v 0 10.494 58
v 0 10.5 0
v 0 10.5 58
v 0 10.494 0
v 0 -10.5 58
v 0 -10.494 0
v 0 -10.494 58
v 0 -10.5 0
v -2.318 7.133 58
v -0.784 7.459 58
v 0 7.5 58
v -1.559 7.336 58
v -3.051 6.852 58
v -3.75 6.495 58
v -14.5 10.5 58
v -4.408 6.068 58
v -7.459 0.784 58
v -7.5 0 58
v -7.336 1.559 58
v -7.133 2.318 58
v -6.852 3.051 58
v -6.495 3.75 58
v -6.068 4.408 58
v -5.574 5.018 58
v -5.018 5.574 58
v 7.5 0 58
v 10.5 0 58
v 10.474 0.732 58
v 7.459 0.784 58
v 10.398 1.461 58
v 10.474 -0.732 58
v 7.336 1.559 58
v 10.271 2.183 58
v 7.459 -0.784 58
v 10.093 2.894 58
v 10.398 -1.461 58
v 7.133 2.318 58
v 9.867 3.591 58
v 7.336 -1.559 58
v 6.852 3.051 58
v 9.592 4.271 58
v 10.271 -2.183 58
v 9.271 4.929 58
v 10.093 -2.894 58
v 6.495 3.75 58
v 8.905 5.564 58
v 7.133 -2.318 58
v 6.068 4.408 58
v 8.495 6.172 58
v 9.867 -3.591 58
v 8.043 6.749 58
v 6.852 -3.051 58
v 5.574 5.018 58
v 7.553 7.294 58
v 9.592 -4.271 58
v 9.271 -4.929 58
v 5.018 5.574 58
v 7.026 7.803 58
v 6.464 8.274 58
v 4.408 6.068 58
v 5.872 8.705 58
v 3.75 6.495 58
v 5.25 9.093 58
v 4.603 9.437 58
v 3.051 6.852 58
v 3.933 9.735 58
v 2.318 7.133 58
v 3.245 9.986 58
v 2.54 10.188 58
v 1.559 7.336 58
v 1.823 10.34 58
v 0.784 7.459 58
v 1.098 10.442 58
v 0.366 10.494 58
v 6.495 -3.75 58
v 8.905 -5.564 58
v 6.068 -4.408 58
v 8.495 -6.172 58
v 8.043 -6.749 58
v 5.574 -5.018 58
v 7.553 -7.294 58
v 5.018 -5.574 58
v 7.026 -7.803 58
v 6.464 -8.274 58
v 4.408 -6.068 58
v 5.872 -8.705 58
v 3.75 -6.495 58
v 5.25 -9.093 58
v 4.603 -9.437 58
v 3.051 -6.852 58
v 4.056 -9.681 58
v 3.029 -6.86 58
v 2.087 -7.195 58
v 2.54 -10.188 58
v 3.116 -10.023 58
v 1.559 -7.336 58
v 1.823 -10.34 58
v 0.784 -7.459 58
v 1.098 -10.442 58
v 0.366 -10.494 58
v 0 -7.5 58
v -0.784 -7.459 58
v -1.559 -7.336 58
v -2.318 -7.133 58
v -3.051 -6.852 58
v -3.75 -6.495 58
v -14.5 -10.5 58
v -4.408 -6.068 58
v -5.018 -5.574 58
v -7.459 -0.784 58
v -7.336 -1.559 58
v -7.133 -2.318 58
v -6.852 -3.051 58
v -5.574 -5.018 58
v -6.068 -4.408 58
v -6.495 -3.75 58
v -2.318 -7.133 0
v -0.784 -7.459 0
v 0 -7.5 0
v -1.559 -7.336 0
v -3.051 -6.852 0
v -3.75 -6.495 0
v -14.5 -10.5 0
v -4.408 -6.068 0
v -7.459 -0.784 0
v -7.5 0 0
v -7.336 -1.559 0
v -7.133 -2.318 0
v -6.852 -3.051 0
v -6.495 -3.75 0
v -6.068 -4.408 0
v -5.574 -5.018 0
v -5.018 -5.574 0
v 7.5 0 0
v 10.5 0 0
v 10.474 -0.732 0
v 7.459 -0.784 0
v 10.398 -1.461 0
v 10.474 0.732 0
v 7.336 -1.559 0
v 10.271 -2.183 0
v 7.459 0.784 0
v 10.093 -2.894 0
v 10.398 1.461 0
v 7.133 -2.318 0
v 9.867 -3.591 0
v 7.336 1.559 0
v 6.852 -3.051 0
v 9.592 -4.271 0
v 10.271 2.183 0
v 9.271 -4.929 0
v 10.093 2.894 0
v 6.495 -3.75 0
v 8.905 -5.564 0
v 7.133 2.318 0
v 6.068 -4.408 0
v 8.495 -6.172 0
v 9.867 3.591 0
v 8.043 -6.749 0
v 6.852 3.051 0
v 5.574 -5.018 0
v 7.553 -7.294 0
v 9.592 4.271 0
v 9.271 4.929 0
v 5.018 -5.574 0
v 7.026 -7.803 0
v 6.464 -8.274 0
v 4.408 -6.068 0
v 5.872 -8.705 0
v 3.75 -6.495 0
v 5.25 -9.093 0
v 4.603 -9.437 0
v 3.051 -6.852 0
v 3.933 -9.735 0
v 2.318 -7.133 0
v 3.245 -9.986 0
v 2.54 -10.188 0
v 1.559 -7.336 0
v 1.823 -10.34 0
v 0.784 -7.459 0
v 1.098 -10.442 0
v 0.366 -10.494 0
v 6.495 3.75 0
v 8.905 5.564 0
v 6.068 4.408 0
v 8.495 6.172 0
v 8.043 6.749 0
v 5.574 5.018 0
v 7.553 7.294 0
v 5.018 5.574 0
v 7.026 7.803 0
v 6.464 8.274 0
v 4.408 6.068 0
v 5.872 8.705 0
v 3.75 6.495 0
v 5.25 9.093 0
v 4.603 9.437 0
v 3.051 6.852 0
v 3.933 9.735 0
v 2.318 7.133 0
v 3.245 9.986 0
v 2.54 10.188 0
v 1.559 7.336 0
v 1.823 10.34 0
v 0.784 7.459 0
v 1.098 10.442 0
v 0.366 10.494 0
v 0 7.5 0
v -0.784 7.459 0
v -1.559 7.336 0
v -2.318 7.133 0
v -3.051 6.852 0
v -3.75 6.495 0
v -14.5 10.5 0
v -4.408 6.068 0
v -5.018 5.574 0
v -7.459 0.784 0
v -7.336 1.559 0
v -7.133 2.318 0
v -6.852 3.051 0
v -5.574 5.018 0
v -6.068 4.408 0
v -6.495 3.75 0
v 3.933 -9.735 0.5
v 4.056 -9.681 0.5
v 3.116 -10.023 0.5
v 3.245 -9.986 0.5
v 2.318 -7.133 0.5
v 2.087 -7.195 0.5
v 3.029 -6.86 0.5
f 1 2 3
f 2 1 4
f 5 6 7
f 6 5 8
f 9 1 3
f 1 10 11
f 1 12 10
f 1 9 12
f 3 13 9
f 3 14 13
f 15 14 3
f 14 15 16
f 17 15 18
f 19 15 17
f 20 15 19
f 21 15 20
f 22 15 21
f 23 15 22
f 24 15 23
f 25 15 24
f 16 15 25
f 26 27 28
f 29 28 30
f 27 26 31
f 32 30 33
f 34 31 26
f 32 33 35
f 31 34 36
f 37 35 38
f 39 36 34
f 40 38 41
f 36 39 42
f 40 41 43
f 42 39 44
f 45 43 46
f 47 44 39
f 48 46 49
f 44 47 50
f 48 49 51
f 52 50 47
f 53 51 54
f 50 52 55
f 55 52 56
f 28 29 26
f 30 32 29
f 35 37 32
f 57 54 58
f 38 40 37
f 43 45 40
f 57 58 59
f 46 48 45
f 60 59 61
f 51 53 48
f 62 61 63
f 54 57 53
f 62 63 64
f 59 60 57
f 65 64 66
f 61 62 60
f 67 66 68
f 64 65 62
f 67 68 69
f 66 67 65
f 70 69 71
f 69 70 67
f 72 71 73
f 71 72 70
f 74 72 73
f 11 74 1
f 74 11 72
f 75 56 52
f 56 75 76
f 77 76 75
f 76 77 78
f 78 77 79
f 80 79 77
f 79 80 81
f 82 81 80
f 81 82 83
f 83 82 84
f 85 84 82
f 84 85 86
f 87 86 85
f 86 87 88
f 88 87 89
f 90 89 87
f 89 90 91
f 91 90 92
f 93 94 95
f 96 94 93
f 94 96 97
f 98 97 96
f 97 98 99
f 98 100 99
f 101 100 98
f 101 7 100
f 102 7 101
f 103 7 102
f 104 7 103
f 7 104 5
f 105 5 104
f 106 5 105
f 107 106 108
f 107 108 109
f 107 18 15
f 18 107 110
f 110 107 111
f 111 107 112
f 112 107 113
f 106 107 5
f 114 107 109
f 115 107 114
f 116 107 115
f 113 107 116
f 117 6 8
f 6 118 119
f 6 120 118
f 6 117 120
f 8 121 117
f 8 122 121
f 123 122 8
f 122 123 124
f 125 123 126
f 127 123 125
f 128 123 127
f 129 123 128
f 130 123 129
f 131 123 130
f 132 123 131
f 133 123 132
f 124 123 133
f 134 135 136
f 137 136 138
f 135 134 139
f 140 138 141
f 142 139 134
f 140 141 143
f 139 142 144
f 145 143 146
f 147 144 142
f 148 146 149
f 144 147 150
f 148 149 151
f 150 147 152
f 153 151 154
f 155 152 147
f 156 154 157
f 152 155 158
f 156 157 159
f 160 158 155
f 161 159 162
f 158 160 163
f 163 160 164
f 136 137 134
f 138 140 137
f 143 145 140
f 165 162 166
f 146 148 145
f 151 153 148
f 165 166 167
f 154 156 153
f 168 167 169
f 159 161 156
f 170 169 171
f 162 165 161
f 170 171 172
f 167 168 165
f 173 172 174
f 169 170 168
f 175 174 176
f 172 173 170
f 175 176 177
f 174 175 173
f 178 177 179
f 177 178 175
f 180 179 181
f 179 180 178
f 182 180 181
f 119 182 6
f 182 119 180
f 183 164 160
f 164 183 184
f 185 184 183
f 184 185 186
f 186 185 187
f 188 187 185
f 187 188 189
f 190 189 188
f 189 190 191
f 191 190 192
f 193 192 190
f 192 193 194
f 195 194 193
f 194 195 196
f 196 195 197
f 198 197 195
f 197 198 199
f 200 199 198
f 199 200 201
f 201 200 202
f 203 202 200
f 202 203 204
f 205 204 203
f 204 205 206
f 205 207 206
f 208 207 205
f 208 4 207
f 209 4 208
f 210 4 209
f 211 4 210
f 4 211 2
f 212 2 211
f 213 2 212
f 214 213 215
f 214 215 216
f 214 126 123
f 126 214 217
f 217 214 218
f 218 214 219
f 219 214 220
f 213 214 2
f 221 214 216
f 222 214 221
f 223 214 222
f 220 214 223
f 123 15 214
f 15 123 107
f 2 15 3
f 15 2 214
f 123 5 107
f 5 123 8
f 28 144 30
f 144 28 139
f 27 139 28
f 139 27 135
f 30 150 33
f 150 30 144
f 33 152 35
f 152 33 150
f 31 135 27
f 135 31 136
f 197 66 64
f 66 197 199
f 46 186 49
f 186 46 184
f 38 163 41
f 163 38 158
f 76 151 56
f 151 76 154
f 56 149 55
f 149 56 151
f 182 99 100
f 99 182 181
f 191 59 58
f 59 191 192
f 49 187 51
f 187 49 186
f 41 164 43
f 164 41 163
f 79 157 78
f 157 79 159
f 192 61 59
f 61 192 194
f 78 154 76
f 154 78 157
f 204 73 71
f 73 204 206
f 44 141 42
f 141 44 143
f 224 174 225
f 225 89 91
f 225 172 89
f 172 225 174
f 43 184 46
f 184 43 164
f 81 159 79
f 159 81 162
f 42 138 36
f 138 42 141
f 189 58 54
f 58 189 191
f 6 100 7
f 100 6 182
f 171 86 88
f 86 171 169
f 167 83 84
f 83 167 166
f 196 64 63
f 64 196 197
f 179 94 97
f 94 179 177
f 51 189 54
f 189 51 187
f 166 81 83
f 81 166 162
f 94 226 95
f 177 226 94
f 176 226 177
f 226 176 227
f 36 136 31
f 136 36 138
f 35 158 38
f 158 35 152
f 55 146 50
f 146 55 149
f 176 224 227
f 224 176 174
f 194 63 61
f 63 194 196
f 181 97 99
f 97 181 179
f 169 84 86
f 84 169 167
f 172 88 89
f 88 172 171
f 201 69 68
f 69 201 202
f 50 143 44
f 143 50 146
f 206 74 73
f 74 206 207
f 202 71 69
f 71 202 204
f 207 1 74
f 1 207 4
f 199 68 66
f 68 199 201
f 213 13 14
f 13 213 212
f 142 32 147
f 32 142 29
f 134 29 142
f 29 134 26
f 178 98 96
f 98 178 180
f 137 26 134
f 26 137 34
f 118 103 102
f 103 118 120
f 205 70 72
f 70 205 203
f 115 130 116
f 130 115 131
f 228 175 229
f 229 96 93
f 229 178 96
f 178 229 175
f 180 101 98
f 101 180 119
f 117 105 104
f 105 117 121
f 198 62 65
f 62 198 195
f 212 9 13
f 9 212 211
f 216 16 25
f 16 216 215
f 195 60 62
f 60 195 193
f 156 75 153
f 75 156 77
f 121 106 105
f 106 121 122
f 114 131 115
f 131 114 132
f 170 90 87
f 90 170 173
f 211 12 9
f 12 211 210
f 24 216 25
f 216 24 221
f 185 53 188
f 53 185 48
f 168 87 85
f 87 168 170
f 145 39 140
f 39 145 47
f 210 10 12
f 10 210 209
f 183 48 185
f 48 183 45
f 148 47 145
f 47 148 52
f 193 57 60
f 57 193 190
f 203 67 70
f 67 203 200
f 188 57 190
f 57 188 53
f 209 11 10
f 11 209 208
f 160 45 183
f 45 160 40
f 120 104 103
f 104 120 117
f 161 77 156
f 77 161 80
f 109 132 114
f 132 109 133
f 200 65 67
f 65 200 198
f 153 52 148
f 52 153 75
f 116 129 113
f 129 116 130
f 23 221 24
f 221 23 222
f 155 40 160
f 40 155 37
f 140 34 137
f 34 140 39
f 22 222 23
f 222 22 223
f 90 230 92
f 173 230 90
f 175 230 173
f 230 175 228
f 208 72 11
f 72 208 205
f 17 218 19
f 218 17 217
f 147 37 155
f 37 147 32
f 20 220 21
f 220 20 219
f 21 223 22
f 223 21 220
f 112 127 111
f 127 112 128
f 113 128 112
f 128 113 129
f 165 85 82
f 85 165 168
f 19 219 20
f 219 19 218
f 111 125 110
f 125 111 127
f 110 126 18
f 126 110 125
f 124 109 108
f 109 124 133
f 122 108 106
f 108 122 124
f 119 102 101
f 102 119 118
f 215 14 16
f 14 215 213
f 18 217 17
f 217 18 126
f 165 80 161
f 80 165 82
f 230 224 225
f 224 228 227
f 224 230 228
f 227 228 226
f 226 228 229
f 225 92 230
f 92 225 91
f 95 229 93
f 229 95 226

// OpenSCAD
// PRUSA iteration3
// Bearing holders
// GNU GPL v3
// Josef Průša <iam@josefprusa.cz> and contributors
// http://www.reprap.org/wiki/Prusa_Mendel
// http://prusamendel.org

bearing_diameter = 15;

module horizontal_bearing_base(bearings=1) {
  translate(v=[0,0,6]) cube(size = [24,8+bearings*25,12], center = true);
}

module horizontal_bearing_holes(bearings=1) {
  cutter_lenght = 10+bearings*25;
  one_holder_lenght = 8+25;
  holder_lenght = 8+bearings*25;

  // Main bearing cut
  difference() {
    translate(v = [0,0,12]) rotate(a = [90,0,0]) translate(v = [0,0,-cutter_lenght/2]) cylinder(h = cutter_lenght, r = bearing_diameter/2, $fn = 50);
    // Bearing retainers
    translate(v=[0,1-holder_lenght/2,3]) cube(size = [24,6,8], center = true);
    translate(v=[0,-1+holder_lenght/2,3]) cube(size = [24,6,8], center = true);
  }

  // Ziptie cutouts
  ziptie_cut_ofset = 0;

  for (i = [0:bearings-1]) {
    // For easier positioning I move them by half of one
    // bearing holder then add each bearign lenght and then center again
    translate(v = [0,-holder_lenght/2,0]) translate(v = [0,one_holder_lenght/2+i*25,0]) difference(){
      union(){
        translate(v = [0,2-6,12]) rotate(a = [90,0,0]) translate(v = [0,0,0]) cylinder(h = 4, r = 12.5, $fn = 50);
        translate(v = [0,2+6,12]) rotate(a = [90,0,0]) translate(v = [0,0,0]) cylinder(h = 4, r = 12.5, $fn = 50);
      }
      translate(v = [0,10,12]) rotate(a = [90,0,0]) translate(v = [0,0,0]) cylinder(h = 24, r = 10, $fn = 50);
    }
  }
}

module horizontal_bearing_test() {
  difference(){
    horizontal_bearing_base(1);
    horizontal_bearing_holes(1);
  }
  translate(v=[30,0,0]) difference(){
    horizontal_bearing_base(2);
    horizontal_bearing_holes(2);
  }
  translate(v=[60,0,0]) difference(){
    horizontal_bearing_base(3);
    horizontal_bearing_holes(3);
  }
}

thinwall = 3;
bearing_size = bearing_diameter + 2 * thinwall;

module vertical_bearing_base() {
  translate(v = [-2-bearing_size/4,0,29]) cube(size = [4+bearing_size/2,bearing_size,58], center = true);
  cylinder(h = 58, r=bearing_size/2, $fn = 90);
}

module vertical_bearing_holes() {
  translate(v = [0,0,-1]) cylinder(h = 62, r = bearing_diameter/2, $fn = 60);
  rotate(a = [0,0,-70]) translate(v = [8,0,31.5]) cube(size = [5,1,62], center = true);
}

difference() {
  vertical_bearing_base();
  vertical_bearing_holes();
}
